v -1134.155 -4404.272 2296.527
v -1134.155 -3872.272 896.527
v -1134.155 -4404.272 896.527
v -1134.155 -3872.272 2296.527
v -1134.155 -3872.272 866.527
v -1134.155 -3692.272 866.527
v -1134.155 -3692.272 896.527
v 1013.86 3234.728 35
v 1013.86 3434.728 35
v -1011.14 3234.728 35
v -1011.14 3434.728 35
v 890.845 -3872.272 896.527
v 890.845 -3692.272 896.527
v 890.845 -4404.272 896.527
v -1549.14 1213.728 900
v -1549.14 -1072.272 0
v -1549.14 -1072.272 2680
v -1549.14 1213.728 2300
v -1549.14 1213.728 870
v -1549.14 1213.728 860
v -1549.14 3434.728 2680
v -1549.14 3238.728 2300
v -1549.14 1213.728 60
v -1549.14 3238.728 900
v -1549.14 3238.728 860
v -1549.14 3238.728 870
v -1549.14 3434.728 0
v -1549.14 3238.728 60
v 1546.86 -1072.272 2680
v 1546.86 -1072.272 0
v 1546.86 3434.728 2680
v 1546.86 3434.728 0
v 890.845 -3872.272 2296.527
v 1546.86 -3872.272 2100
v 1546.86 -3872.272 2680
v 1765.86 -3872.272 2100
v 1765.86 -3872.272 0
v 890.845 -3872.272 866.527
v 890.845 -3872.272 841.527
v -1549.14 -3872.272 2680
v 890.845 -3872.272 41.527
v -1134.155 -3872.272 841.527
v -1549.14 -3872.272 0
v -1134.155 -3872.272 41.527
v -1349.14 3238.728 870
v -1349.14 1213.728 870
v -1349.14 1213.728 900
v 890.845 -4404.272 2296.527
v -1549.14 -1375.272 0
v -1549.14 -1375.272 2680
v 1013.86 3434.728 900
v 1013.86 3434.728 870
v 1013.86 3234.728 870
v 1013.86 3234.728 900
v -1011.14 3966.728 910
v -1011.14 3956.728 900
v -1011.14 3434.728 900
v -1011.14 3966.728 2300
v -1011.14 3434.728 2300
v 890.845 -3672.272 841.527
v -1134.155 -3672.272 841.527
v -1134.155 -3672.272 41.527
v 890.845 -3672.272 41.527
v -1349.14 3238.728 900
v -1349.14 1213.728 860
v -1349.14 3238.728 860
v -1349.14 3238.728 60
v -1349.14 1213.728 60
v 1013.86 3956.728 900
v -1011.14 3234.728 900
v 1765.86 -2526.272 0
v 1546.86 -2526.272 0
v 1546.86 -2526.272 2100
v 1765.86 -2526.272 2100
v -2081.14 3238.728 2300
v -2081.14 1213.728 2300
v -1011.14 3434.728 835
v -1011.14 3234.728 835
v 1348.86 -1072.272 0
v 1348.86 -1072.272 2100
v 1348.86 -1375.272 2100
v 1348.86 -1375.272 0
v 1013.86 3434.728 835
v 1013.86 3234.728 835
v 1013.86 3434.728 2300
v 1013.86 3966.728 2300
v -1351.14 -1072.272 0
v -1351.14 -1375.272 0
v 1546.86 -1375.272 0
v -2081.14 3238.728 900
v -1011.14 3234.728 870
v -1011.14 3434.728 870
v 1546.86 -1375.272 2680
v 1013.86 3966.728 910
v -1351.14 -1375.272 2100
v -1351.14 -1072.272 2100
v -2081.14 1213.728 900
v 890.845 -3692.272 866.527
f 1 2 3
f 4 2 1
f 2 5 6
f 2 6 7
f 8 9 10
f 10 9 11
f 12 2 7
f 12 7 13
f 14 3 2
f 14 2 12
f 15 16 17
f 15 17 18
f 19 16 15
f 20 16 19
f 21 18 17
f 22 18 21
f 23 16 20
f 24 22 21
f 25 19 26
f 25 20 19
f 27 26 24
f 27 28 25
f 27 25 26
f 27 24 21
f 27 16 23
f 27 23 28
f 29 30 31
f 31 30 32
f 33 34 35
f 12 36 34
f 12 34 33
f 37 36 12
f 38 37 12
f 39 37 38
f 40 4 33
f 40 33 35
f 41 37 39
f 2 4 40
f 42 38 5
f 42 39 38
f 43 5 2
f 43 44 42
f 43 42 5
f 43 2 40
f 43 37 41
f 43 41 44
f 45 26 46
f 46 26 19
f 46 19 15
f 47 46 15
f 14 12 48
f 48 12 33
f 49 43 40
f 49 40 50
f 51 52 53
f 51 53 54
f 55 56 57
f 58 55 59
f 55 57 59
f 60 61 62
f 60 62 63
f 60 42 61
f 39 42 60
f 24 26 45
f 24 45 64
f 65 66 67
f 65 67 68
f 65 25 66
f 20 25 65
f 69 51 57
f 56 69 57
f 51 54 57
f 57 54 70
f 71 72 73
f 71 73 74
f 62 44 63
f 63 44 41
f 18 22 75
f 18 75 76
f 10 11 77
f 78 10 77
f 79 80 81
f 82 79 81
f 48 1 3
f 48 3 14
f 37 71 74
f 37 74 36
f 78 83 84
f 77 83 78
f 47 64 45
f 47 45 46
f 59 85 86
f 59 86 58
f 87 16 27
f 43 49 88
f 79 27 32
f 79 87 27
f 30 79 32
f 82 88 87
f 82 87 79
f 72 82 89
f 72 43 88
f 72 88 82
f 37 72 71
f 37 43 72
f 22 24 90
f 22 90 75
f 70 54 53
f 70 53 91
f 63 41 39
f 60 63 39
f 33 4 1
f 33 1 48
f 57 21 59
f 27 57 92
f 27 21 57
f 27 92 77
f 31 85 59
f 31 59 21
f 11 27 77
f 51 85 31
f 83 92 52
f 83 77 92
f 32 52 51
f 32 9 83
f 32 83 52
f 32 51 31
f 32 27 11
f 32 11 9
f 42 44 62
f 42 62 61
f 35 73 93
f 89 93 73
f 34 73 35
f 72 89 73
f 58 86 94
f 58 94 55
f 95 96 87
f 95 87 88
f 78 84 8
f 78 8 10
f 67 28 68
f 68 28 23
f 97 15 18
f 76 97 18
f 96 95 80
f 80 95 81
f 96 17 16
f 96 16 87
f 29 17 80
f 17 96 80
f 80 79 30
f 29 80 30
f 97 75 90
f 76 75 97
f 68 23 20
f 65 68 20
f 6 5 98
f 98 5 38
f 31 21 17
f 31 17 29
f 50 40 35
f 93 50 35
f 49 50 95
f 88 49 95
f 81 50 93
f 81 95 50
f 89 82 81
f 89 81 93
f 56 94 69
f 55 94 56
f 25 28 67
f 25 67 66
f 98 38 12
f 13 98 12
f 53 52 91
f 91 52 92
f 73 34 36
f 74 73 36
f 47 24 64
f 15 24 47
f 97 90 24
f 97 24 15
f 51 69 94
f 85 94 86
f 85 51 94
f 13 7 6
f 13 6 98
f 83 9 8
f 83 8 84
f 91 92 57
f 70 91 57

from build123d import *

# Parameters (mm, degrees)
F0_W      = 3096
F0_H      = 4507
F1_DEPTH  = 2680
F2_W      = 2025
F2_H      = 1400
F3_DEPTH  = 532
F4_W      = 2025
F4_H      = 1400
F5_DEPTH  = 532
F6_W      = 2025
F6_H      = 800
F7_DEPTH  = 200
F8_W      = 2700
F8_H      = 303
F9_DEPTH  = 2100
F11_DEPTH = 2680
F12_W     = 219
F12_H     = 1346
F13_DEPTH = 2100
F14_W     = 2025
F14_H     = 1400
F15_DEPTH = 532
F17_SIZE  = 10
F19_W     = 2025
F19_H     = 30
F20_DEPTH = 200
F21_W     = 2025
F21_H     = 30
F22_DEPTH = 180
F18_W     = 2025
F18_H     = 800
F23_DEPTH = 200
F24_W     = 2025
F24_H     = 30
F25_DEPTH = 200
F26_W     = 2025
F26_H     = 800
F27_DEPTH = 200


with BuildPart() as f1:
    # F0 (on Top) → F1 (new body)
    with BuildSketch(Plane.XY):
        with Locations((-1.140241, 1181.228137)):
            Rectangle(F0_W, F0_H)
    extrude(amount=F1_DEPTH)

    # F2 (on face) → F3 (join)
    with BuildSketch(Plane(origin=(0, 3434.728137, 0), x_dir=(-1, 0, 0), z_dir=(0, 1, 0))):
        with Locations((-1.359759, 1600)):
            Rectangle(F2_W, F2_H)
    extrude(amount=F3_DEPTH)

    # F4 (on face) → F5 (join)
    with BuildSketch(Plane(origin=(-1549.140241, 0, 0), x_dir=(0, -1, 0), z_dir=(-1, 0, 0))):
        with Locations((-2226.228137, 1600)):
            Rectangle(F4_W, F4_H)
    extrude(amount=F5_DEPTH)

    # F6 (on face) → F7 (cut)
    with BuildSketch(Plane(origin=(0, 3434.728137, 0), x_dir=(-1, 0, 0), z_dir=(0, 1, 0))):
        with Locations((-1.359759, 435)):
            Rectangle(F6_W, F6_H)
    extrude(amount=-F7_DEPTH, mode=Mode.SUBTRACT)

    # F8 (on face) → F9 (join)
    with BuildSketch(Plane(origin=(0, 0, 0), x_dir=(1, 0, 0), z_dir=(0, 0, -1))):
        with Locations((-1.140241, 1223.771863)):
            Rectangle(F8_W, F8_H)
    extrude(amount=-F9_DEPTH)

    # F10 (on face) → F11 (join)
    with BuildSketch(Plane(origin=(0, 0, 0), x_dir=(1, 0, 0), z_dir=(0, 0, -1))):
        Polygon((-1549.140241, 3872.271863), (-1549.140241, 1375.271863), (-1351.140241, 1375.271863), (1546.859759, 1375.271863), (1546.859759, 3872.271863), align=None)
    extrude(amount=-F11_DEPTH)

    # F12 (on face) → F13 (join)
    with BuildSketch(Plane(origin=(0, 0, 0), x_dir=(1, 0, 0), z_dir=(0, 0, -1))):
        with Locations((1656.359759, 3199.271863)):
            Rectangle(F12_W, F12_H)
    extrude(amount=-F13_DEPTH)

    # F14 (on face) → F15 (join)
    with BuildSketch(Plane.XZ.offset(3872.271863)):
        with Locations((-121.65477, 1596.527308)):
            Rectangle(F14_W, F14_H)
    extrude(amount=F15_DEPTH)

    # F17
    f17_edges = [f1.edges().sort_by_distance(p)[0] for p in [
        (1.359759, 3966.728137, 900),
    ]]
    chamfer(f17_edges, length=F17_SIZE)

    # F19 (on face) → F20 (cut)
    with BuildSketch(Plane(origin=(0, 3434.728137, 0), x_dir=(-1, 0, 0), z_dir=(0, 1, 0))):
        with Locations((-1.359759, 885)):
            Rectangle(F19_W, F19_H)
    extrude(amount=-F20_DEPTH, mode=Mode.SUBTRACT)

    # F21 (on face) → F22 (cut)
    with BuildSketch(Plane.XZ.offset(3872.271863)):
        with Locations((-121.65477, 881.527308)):
            Rectangle(F21_W, F21_H)
    extrude(amount=-F22_DEPTH, mode=Mode.SUBTRACT)

    # F18 (on face) → F23 (cut)
    with BuildSketch(Plane(origin=(-1549.140241, 0, 0), x_dir=(0, -1, 0), z_dir=(-1, 0, 0))):
        with Locations((-2226.228137, 460)):
            Rectangle(F18_W, F18_H)
    extrude(amount=-F23_DEPTH, mode=Mode.SUBTRACT)

    # F24 (on face) → F25 (cut)
    with BuildSketch(Plane(origin=(-1549.140241, 0, 0), x_dir=(0, -1, 0), z_dir=(-1, 0, 0))):
        with Locations((-2226.228137, 885)):
            Rectangle(F24_W, F24_H)
    extrude(amount=-F25_DEPTH, mode=Mode.SUBTRACT)

    # F26 (on face) → F27 (cut)
    with BuildSketch(Plane.XZ.offset(3872.271863)):
        with Locations((-121.65477, 441.527308)):
            Rectangle(F26_W, F26_H)
    extrude(amount=-F27_DEPTH, mode=Mode.SUBTRACT)


solid = f1.part
